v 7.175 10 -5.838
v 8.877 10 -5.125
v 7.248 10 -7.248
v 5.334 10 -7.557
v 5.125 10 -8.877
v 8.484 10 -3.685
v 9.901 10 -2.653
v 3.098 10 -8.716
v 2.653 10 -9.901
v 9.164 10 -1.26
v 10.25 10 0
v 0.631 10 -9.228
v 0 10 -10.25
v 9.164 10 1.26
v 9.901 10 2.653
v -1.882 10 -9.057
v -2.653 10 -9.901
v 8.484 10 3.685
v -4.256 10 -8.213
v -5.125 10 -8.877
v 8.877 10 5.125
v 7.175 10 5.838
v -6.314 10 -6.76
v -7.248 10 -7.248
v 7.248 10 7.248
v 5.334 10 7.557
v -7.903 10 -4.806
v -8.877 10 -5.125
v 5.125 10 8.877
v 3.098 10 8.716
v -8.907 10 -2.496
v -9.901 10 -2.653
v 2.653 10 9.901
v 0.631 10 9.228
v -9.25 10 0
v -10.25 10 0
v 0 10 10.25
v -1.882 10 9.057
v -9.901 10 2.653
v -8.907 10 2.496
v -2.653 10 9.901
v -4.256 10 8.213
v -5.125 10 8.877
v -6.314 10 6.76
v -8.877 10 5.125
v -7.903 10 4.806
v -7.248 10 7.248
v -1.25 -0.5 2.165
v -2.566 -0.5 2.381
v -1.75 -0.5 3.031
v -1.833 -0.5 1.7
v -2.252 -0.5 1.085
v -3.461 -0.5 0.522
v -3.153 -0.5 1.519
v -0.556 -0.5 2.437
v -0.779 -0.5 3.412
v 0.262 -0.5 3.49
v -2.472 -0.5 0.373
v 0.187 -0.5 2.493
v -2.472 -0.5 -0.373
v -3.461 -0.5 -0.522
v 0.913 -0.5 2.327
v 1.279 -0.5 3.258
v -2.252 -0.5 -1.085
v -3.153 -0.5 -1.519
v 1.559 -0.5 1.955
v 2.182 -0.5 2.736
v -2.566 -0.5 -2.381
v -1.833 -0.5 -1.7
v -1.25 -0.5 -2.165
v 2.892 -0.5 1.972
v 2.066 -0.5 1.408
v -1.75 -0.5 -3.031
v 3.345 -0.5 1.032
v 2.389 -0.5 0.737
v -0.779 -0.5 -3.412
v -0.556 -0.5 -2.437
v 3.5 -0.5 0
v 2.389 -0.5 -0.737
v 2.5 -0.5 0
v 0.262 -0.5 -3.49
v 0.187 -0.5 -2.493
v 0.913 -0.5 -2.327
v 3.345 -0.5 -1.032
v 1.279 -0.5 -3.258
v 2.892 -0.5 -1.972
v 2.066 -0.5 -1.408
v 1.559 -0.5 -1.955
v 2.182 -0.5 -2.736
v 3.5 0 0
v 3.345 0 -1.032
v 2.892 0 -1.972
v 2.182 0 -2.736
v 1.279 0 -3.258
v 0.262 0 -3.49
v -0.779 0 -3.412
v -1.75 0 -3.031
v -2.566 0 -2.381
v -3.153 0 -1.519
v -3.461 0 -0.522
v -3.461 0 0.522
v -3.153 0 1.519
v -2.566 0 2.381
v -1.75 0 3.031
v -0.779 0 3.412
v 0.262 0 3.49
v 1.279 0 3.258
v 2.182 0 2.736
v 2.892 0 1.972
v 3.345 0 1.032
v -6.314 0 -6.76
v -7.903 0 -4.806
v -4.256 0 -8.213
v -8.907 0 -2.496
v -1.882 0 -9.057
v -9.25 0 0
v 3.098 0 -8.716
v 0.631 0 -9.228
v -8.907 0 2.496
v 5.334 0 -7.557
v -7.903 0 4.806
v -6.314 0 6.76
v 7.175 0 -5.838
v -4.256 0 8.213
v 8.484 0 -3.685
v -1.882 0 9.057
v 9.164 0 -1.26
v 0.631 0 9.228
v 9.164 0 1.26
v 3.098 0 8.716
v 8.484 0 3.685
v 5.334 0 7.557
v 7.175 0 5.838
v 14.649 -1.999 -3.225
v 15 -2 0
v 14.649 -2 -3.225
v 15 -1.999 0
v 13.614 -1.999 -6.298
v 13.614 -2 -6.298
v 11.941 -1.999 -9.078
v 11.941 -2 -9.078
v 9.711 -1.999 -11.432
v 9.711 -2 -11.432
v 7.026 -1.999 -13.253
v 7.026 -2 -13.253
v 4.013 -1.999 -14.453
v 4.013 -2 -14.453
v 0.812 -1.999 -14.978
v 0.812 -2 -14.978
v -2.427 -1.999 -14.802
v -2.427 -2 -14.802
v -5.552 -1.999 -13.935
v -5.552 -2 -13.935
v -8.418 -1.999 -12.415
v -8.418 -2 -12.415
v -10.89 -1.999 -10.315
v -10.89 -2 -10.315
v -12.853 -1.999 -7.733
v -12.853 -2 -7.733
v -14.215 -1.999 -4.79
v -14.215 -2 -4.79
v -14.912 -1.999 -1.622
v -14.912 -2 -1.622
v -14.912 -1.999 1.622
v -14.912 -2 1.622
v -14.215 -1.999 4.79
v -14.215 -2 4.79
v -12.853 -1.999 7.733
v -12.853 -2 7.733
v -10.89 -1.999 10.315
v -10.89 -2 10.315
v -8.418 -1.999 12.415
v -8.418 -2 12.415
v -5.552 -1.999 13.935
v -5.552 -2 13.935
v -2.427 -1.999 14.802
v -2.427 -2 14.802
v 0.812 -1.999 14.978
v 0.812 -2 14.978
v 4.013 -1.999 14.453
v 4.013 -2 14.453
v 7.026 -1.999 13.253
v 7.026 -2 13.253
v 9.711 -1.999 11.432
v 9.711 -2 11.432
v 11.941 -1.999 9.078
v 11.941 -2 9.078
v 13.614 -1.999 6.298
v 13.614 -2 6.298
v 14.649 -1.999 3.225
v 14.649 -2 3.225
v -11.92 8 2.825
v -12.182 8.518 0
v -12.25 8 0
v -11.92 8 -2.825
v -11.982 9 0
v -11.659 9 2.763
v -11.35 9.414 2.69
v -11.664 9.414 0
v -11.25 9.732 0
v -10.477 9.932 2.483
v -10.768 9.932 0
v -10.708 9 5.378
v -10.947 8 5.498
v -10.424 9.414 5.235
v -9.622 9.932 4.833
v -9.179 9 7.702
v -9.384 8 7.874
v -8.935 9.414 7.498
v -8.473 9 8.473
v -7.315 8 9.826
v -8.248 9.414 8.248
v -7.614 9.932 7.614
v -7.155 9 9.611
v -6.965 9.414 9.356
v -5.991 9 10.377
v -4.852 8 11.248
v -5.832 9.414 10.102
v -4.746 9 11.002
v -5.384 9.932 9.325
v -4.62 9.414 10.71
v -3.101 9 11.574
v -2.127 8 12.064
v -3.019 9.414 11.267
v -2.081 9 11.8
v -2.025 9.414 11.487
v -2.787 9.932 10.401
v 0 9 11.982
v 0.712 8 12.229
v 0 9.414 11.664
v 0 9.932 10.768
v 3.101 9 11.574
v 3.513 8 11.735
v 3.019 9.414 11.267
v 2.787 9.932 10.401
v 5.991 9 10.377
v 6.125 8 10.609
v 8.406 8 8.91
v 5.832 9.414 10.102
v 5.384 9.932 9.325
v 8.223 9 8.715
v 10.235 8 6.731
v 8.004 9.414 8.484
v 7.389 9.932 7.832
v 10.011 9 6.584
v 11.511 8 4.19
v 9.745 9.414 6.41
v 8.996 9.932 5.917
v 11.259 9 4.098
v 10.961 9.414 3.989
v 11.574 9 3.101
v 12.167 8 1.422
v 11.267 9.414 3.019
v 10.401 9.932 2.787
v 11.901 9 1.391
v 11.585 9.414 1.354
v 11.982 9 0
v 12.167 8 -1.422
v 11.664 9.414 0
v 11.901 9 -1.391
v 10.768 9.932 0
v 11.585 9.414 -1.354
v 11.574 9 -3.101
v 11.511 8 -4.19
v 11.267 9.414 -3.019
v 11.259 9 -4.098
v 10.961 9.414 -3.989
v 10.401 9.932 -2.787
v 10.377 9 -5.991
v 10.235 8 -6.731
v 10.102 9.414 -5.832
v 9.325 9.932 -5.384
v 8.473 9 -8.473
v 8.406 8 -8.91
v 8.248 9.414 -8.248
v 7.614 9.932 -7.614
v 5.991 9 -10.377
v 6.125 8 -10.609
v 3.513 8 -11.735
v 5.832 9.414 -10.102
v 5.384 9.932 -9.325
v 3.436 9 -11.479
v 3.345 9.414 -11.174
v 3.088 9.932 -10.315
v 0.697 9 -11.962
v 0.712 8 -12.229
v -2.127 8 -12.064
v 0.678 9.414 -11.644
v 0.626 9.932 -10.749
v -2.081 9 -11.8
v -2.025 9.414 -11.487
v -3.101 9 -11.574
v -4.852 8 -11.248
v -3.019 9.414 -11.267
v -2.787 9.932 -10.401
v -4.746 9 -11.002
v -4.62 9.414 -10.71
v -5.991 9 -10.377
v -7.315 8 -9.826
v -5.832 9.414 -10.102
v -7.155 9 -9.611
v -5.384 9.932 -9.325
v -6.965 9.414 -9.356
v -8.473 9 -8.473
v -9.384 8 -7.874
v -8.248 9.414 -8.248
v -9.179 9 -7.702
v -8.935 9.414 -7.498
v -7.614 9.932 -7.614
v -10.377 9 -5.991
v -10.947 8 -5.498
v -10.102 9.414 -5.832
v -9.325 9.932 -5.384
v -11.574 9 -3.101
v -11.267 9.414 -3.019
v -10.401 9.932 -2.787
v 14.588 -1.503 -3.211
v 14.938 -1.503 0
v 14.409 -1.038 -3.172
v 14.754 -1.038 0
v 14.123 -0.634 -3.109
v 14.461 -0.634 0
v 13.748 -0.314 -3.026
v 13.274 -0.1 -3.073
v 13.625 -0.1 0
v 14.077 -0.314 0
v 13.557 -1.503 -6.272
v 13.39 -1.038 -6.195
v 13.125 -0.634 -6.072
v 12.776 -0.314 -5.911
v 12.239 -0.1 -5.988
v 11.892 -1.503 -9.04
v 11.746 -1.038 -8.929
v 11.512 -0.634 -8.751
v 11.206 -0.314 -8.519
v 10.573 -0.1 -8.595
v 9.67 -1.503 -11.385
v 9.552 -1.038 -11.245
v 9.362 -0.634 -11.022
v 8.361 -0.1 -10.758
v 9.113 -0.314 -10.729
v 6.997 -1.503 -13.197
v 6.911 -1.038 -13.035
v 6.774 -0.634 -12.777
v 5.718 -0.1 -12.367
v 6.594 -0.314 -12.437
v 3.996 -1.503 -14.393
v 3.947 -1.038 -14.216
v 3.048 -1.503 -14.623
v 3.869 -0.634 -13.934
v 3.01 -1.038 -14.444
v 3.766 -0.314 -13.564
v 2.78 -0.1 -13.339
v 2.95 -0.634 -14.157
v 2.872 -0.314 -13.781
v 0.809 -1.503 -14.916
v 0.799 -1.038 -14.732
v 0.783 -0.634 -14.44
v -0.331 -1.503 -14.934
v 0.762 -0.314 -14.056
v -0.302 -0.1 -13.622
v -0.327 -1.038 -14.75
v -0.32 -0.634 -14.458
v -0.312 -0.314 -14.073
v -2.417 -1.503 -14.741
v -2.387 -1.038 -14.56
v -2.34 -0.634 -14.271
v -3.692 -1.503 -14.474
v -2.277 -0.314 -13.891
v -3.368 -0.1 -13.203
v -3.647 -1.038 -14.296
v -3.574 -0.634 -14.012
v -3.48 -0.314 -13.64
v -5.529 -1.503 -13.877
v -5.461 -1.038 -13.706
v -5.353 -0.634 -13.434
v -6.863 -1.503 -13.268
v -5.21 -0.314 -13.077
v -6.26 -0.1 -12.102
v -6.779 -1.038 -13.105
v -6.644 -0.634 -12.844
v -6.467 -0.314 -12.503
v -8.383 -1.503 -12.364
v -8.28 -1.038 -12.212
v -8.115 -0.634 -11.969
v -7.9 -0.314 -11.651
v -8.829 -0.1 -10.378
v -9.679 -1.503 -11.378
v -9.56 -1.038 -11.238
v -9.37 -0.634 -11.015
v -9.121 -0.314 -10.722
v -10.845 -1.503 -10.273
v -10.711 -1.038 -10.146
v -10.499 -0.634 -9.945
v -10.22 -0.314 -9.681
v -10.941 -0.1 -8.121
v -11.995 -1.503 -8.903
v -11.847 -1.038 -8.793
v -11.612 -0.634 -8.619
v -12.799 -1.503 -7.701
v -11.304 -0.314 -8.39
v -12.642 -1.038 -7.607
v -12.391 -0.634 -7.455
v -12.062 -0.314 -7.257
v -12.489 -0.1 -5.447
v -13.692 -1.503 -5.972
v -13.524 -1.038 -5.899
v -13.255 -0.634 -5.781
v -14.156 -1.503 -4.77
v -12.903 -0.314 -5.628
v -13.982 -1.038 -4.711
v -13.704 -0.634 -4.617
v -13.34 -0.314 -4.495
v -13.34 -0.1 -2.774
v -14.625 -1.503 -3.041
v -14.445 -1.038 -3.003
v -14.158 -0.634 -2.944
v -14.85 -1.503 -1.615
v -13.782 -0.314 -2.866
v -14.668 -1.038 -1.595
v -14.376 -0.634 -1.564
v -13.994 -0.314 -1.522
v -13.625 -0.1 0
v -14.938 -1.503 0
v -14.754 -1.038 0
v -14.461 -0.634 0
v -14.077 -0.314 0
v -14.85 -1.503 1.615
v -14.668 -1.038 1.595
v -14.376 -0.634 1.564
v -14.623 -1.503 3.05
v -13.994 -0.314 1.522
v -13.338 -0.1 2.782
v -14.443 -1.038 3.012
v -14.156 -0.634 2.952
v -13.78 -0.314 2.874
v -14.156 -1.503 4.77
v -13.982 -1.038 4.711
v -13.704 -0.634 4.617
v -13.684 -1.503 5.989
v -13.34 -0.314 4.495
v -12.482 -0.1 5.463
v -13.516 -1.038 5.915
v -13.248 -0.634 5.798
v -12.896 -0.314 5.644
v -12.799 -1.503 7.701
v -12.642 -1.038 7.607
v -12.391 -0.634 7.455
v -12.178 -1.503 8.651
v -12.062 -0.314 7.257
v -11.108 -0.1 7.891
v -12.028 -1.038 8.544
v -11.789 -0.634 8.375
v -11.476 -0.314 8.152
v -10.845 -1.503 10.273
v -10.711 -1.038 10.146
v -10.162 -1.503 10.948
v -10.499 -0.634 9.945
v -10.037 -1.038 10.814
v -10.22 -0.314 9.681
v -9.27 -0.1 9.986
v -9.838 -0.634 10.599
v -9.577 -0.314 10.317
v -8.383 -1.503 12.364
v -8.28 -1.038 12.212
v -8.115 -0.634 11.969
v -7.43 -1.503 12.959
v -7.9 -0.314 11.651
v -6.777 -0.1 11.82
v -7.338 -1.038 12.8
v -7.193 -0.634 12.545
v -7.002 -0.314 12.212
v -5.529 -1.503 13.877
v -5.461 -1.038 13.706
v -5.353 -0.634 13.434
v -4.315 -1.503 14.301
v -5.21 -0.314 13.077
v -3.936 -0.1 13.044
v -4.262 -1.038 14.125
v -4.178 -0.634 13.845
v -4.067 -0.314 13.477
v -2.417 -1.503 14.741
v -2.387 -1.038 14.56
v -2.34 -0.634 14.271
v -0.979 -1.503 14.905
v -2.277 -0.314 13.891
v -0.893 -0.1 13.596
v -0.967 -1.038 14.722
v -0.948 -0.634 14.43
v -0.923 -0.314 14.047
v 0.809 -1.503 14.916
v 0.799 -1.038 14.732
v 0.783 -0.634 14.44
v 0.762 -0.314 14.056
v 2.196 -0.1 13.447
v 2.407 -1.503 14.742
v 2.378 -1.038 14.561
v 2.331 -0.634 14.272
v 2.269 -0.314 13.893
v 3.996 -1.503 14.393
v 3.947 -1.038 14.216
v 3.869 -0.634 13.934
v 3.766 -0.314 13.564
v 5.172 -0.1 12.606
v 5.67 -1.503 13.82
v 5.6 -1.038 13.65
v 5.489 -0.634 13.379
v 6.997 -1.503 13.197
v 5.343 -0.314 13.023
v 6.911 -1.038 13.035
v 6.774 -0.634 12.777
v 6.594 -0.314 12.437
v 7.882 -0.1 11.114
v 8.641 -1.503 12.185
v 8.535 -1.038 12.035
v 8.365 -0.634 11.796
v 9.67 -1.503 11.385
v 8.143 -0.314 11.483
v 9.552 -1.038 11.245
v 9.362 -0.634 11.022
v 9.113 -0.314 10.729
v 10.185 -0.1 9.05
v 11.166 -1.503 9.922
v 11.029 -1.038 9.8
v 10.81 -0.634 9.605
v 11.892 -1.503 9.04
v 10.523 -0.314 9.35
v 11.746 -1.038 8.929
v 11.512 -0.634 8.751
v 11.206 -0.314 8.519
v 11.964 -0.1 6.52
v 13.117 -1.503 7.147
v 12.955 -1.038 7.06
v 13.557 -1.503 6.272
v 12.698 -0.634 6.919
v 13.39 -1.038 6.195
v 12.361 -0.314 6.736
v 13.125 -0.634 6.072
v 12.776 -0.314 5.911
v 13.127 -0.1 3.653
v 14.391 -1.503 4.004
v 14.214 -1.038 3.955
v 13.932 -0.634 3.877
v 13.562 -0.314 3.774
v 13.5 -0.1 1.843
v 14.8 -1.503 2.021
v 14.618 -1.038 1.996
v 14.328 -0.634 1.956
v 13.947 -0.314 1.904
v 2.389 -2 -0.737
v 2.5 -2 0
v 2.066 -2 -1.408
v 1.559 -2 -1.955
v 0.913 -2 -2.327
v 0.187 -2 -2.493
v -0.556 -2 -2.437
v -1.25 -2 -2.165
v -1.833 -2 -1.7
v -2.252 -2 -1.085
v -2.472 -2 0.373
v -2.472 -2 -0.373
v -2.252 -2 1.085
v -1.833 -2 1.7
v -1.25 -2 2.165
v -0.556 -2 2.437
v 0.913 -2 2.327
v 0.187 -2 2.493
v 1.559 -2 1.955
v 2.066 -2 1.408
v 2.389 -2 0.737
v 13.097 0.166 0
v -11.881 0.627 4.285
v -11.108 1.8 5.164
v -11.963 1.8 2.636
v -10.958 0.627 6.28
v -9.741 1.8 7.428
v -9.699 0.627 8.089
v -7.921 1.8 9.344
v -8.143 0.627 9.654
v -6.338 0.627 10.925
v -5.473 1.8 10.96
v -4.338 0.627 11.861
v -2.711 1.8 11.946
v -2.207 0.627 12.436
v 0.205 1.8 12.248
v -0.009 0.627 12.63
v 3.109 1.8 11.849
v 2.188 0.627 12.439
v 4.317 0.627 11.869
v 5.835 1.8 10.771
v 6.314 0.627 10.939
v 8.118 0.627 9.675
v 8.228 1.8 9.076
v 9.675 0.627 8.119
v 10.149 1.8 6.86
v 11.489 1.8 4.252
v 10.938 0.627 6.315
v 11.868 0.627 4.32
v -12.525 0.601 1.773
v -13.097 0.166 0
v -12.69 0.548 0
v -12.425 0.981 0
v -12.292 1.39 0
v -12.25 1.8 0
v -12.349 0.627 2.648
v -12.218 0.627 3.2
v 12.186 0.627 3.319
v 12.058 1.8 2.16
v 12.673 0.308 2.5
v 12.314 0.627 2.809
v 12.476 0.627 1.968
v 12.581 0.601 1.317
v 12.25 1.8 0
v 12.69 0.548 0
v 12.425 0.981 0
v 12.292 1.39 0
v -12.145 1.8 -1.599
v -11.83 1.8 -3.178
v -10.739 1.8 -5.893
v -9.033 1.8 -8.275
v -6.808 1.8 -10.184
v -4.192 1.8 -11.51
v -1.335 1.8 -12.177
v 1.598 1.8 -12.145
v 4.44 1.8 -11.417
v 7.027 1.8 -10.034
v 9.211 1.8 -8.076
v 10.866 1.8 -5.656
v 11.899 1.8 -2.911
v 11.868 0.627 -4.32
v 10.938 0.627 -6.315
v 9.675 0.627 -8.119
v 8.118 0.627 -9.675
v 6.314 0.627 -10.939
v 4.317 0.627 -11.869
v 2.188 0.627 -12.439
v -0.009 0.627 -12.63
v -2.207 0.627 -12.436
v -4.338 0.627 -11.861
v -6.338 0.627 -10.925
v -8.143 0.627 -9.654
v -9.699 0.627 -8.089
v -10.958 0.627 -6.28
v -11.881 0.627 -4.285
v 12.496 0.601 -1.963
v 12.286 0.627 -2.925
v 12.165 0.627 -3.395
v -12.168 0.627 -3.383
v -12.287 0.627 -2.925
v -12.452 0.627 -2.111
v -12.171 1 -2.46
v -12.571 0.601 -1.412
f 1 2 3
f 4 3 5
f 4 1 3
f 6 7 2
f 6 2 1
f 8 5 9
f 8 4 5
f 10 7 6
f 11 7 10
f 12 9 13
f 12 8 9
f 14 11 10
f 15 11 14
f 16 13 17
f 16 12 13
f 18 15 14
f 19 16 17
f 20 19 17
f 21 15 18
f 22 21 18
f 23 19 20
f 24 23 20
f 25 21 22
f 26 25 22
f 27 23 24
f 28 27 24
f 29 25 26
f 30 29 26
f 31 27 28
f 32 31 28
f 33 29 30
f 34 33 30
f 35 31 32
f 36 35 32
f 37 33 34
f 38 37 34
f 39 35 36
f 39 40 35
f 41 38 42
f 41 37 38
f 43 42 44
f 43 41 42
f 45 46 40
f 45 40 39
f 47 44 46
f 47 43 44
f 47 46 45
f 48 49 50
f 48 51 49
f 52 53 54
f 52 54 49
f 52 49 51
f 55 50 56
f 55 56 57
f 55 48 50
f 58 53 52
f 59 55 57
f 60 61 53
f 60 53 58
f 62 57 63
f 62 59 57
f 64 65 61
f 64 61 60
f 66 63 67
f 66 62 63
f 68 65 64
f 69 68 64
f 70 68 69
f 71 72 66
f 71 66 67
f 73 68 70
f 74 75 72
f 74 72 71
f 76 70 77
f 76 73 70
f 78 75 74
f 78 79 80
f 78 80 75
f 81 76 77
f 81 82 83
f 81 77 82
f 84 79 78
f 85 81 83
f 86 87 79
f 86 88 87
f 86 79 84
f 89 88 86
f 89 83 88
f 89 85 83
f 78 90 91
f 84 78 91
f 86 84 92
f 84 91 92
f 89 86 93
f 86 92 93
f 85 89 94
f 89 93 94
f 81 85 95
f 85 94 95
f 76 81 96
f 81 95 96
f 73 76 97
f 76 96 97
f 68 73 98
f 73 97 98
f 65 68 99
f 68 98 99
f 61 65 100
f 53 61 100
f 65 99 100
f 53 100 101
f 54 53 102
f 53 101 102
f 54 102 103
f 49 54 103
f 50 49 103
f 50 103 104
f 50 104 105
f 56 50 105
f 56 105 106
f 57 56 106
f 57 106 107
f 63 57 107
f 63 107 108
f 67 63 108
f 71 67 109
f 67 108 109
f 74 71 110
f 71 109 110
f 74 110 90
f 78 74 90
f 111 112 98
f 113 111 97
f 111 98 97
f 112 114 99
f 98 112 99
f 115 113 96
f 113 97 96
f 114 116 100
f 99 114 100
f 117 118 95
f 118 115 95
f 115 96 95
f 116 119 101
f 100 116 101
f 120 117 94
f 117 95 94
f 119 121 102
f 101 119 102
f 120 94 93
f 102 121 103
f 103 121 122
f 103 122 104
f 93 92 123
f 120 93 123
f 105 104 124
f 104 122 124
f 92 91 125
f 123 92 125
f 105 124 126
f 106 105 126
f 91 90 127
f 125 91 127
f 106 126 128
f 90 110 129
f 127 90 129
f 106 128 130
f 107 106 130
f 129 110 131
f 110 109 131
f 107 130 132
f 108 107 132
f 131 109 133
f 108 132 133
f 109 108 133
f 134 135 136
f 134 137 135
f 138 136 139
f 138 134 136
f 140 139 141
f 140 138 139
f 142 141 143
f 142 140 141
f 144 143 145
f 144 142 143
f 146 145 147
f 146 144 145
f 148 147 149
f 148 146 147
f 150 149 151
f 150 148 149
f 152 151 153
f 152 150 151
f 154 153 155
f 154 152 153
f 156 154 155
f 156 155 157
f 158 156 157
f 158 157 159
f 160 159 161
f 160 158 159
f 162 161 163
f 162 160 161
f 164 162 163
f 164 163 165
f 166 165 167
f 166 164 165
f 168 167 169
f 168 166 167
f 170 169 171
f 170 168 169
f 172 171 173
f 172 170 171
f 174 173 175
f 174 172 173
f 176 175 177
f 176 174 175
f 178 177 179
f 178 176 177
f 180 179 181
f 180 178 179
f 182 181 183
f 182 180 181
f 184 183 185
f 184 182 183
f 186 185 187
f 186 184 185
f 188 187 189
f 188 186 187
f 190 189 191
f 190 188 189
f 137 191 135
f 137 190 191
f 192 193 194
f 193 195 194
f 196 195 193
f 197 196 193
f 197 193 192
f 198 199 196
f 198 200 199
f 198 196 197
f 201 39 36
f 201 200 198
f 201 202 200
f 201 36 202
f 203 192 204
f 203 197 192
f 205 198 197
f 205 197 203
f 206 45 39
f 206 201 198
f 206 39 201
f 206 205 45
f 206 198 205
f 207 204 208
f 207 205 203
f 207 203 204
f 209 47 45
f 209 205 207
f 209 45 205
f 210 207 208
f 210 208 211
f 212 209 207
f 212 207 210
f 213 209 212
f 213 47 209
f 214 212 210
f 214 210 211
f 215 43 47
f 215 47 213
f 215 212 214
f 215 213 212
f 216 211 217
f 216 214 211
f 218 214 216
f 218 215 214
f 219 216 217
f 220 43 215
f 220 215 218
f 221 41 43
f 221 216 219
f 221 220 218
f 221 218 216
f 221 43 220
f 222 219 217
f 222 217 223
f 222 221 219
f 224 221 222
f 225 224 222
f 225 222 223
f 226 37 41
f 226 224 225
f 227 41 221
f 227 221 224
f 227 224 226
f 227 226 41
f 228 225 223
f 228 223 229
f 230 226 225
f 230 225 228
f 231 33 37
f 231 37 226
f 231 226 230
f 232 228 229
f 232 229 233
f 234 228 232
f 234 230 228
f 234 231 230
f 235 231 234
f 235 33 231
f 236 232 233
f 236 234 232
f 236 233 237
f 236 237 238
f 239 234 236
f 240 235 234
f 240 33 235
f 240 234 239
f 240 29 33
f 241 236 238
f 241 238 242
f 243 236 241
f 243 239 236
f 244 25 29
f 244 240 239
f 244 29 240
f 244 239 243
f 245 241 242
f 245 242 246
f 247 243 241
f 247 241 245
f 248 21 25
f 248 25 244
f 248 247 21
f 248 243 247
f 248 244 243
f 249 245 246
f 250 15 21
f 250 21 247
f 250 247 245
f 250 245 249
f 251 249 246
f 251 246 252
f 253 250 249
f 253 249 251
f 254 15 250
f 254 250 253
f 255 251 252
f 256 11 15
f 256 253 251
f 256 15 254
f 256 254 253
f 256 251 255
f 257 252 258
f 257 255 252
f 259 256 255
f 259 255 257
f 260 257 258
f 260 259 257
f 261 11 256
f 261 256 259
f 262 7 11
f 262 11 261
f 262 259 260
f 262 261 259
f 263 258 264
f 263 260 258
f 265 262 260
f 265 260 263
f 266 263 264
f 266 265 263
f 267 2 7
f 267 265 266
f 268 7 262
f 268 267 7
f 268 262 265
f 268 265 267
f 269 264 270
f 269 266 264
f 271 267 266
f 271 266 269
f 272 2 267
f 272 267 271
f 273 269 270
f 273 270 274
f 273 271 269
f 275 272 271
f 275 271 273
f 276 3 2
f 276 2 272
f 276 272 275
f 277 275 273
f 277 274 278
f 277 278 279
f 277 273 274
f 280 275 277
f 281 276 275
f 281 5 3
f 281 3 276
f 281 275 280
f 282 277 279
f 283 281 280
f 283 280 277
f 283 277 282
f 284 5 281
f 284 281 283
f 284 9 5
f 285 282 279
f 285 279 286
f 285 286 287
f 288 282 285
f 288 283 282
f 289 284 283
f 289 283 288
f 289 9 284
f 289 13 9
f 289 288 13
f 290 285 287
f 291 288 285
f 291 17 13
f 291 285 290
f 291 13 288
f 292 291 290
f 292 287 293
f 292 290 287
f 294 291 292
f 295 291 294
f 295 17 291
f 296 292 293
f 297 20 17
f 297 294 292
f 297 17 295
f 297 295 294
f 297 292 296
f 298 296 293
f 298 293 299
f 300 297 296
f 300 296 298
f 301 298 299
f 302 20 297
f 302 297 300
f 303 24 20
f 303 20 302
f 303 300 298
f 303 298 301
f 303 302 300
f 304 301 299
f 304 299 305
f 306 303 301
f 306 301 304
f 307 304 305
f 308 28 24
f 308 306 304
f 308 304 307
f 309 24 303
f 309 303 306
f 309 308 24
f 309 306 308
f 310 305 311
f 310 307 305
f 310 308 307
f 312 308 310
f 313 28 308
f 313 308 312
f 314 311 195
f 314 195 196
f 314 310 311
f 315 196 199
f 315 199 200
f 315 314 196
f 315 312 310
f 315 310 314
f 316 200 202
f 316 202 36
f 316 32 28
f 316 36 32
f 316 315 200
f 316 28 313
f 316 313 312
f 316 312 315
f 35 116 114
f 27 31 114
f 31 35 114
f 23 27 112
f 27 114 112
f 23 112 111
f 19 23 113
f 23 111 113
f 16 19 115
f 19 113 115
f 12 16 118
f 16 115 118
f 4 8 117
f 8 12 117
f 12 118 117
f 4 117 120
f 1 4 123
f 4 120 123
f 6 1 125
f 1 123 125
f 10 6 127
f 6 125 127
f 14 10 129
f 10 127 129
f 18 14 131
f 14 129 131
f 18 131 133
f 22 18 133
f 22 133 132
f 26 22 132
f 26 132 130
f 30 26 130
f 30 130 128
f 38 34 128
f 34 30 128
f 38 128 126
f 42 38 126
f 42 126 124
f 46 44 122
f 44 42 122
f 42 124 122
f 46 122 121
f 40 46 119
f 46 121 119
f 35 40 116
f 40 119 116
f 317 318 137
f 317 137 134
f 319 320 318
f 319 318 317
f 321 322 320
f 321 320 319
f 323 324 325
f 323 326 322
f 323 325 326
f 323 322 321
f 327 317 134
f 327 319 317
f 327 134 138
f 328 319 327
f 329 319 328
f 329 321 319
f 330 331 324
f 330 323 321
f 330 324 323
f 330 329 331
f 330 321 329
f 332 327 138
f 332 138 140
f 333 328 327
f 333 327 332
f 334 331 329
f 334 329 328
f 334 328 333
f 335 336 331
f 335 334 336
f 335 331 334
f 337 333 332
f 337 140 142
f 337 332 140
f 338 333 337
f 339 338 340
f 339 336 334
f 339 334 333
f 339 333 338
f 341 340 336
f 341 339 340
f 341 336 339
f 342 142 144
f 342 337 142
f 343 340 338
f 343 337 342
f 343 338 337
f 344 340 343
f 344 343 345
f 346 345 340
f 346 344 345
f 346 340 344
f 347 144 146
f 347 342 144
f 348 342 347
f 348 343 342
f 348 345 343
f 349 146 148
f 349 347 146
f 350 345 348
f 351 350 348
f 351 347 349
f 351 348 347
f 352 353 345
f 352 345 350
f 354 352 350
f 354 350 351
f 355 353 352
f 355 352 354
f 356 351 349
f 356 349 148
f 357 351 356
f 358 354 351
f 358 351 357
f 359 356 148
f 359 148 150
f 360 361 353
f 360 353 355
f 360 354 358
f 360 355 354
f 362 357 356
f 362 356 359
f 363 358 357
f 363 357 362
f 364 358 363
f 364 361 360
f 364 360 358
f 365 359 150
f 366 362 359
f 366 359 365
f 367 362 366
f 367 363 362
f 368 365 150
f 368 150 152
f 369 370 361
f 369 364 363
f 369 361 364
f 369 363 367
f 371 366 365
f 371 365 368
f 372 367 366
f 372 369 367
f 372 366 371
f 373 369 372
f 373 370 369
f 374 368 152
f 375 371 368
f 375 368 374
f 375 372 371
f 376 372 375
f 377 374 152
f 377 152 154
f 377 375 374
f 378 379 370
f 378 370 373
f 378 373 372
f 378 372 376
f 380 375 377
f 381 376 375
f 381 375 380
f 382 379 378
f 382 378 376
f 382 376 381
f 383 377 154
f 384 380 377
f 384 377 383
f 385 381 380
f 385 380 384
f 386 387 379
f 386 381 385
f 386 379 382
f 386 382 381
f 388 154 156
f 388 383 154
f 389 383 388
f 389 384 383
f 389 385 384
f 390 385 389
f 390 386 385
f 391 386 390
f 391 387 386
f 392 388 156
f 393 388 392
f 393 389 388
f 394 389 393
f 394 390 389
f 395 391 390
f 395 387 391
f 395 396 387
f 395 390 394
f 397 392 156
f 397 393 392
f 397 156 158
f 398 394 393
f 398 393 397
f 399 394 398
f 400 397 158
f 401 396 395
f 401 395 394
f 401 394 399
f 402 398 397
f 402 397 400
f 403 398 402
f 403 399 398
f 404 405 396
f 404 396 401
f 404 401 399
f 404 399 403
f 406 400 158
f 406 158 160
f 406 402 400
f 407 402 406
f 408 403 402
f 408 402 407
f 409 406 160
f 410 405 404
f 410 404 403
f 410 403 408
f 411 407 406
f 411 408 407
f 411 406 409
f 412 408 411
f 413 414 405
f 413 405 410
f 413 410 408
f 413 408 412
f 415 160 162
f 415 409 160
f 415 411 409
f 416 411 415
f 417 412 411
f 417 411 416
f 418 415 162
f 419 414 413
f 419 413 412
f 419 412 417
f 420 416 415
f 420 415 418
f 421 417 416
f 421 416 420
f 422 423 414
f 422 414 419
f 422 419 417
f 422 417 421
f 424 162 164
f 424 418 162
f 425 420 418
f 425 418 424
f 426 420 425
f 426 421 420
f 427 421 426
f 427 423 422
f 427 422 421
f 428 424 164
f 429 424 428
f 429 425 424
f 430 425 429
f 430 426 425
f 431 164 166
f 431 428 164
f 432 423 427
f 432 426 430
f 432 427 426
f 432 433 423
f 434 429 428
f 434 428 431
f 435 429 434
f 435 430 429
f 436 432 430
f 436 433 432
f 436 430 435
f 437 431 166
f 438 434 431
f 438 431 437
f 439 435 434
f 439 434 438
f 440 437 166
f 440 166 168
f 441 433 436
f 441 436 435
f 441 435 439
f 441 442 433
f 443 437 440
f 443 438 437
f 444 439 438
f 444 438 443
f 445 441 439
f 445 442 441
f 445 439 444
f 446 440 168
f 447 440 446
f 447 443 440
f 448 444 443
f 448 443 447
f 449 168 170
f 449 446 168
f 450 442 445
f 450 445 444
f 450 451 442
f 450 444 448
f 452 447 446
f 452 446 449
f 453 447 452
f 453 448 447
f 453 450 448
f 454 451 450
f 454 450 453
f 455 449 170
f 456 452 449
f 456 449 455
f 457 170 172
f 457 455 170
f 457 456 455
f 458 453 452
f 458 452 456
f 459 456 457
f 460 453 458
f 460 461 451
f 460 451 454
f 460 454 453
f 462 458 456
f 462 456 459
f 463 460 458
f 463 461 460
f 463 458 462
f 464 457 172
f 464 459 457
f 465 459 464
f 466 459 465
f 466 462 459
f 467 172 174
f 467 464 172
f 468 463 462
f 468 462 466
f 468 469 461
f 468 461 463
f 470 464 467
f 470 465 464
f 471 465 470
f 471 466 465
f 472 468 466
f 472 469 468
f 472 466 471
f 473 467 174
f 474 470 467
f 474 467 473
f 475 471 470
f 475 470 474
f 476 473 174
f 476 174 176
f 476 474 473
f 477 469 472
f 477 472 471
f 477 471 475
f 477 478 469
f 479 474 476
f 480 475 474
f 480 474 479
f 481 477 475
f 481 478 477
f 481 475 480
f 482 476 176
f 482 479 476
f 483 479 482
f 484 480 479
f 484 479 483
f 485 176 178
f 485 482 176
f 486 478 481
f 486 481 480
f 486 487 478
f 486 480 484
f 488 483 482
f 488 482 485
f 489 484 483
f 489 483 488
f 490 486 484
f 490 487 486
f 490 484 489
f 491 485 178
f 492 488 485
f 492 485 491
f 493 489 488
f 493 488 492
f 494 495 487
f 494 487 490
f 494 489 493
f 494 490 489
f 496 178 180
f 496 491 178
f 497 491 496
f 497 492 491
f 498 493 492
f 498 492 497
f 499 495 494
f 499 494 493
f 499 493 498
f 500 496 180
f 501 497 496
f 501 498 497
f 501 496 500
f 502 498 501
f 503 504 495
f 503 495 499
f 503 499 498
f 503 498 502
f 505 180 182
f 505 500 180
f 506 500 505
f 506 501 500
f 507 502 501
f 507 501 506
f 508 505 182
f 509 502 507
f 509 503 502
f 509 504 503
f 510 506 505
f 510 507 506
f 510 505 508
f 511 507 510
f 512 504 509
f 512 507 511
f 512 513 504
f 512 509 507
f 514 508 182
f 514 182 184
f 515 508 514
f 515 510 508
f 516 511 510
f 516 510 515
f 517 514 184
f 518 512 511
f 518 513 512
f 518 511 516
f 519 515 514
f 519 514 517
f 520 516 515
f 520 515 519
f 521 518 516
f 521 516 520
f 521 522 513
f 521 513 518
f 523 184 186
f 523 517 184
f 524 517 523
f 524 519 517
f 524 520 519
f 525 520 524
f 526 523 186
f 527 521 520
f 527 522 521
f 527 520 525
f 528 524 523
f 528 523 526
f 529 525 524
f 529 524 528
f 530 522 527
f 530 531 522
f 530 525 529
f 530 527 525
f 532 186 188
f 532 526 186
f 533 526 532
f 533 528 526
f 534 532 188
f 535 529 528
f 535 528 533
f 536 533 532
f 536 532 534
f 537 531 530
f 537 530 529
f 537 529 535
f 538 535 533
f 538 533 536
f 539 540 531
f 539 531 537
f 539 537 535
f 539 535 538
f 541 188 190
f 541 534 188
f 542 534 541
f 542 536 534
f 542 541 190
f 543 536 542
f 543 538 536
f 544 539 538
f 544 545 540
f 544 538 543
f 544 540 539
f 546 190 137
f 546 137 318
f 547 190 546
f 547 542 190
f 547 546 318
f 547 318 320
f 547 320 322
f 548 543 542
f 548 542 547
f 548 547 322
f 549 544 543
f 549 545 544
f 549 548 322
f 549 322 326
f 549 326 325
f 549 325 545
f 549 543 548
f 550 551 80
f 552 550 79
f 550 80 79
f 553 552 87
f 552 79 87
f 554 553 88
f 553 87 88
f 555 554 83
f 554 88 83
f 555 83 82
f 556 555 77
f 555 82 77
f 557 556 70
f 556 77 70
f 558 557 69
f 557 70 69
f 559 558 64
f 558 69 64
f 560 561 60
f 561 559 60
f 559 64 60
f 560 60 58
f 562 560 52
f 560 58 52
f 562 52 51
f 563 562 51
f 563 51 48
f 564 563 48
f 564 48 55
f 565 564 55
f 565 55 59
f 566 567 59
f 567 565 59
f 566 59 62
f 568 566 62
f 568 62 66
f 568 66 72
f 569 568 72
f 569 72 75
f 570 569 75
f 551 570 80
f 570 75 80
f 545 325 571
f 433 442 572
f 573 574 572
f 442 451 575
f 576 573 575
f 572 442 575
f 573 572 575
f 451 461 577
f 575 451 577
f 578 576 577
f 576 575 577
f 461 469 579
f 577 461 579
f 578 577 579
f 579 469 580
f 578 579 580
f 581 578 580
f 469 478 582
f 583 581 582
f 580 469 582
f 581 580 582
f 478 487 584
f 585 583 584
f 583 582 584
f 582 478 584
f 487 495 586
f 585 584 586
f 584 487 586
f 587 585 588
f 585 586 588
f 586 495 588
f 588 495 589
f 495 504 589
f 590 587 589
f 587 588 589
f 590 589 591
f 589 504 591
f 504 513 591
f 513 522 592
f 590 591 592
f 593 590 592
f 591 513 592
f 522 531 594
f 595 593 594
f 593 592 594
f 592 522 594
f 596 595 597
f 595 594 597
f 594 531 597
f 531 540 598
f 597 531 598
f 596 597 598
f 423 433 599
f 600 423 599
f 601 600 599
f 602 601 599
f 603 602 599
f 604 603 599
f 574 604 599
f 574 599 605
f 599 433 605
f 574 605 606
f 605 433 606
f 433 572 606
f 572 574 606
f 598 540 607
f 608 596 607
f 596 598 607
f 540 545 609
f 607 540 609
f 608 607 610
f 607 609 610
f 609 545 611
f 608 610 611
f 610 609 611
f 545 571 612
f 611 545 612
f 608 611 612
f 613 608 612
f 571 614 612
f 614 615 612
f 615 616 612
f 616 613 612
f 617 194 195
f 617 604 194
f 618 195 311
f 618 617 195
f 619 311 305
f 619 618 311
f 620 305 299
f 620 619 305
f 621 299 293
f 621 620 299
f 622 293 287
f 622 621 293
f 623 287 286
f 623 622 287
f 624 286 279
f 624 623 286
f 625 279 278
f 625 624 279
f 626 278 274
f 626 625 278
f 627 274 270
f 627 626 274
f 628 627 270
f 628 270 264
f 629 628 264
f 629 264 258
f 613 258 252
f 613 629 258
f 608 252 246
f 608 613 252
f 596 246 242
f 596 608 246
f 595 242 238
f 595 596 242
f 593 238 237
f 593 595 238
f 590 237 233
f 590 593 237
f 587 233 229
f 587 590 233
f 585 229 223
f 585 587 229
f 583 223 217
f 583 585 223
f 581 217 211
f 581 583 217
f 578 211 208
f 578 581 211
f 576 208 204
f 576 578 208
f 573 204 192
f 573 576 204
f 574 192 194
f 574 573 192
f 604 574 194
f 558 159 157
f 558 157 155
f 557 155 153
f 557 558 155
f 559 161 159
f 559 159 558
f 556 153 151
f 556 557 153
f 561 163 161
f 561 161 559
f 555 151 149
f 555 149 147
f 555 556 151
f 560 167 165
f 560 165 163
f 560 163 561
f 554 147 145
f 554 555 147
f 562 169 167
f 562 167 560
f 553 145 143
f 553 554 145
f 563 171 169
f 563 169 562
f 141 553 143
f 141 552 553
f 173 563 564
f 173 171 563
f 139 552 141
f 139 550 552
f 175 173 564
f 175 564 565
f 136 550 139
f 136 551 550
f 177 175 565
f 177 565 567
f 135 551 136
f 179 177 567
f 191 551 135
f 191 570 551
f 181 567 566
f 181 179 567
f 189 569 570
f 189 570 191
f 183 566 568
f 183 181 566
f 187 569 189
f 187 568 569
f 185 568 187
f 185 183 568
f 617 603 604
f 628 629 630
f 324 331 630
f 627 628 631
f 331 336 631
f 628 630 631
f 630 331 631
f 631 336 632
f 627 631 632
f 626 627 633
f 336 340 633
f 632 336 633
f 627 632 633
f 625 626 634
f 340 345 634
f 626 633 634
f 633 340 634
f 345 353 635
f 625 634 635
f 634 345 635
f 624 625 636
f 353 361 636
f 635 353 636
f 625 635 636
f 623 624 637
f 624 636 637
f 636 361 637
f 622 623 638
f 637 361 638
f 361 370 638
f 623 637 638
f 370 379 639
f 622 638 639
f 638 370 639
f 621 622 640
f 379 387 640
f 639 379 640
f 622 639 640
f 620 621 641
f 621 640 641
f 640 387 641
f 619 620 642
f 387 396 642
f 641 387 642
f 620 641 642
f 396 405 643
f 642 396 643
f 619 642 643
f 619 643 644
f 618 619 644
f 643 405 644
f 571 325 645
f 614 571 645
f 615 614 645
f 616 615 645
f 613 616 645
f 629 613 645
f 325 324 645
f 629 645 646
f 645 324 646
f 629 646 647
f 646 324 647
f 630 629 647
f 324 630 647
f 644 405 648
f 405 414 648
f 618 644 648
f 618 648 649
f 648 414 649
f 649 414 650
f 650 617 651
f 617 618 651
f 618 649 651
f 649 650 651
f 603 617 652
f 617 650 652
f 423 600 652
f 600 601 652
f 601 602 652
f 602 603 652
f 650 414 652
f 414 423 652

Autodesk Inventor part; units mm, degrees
ref_plane "YZ Plane" through (0, 0, 0) normal (1, 0, 0) x (0, 1, 0)
ref_plane "XZ Plane" through (0, 0, 0) normal (0, 1, 0) x (-1, 0, 0)
ref_plane "XY Plane" through (0, 0, 0) normal (0, 0, 1) x (1, 0, 0)
sketch "Sketch1" plane through (0, 0, 0) normal (0, 1, 0) x (-1, 0, 0)
  circle A0 centre (0, 0) radius 9.25
  circle A1 centre (0, 0) radius 12.25
  dimension "d0" = 18.5
  dimension "d1" = 24.5
extrude "Extrusion1" add sketch "Sketch1" along normal blind 10
fillet "Fillet1" radius 2 1 edges at (12.25, 10, 0)
sketch "Sketch2" plane through (0, 0, 0) normal (0, -1, 0) x (1, 0, 0)
  circle A0 centre (0, 0) radius 9.25 projected
  circle A1 centre (0, 0) radius 12.25 projected
  circle A2 centre (0, 0) radius 15
  circle A3 centre (0, 0) radius 2.5
  dimension "d6" = 30
  dimension "d9" = 5
extrude "Extrusion2" add sketch "Sketch2" along normal blind 2 contours A0 | A1 | A2
fillet "Fillet3" radius 2 2 edges at (-15, 0, 0) (12.25, 0, 0)
sketch "Sketch3" plane through (0, 0, 0) normal (0, 1, 0) x (1, 0, 0)
  circle A0 centre (0, 0) radius 2.5 projected
  circle A1 centre (0, 0) radius 9.25 projected
  circle A2 centre (0, 0) radius 3.5
  dimension "d12" = 7
extrude "Extrusion3" cut sketch "Sketch3" against normal blind 0.5 contours A2
equation "\"BendRadius\" = Thickness"
equation "\"BendReliefWidth\" = Thickness"
equation "\"BendReliefDepth\" = 0.5 * Thickness"
equation "\"CornerReliefSize\" = 4 * Thickness"
equation "\"MinimumRemnant\" = 2 * Thickness"
equation "\"TransitionRadius\" = BendRadius"
equation "\"JacobiRadiusSize\" = BendRadius"
equation "\"GapSize\" = Thickness"
equation "\"Thickness\" = 0.5"
properties part number "powerButtonPart2"
